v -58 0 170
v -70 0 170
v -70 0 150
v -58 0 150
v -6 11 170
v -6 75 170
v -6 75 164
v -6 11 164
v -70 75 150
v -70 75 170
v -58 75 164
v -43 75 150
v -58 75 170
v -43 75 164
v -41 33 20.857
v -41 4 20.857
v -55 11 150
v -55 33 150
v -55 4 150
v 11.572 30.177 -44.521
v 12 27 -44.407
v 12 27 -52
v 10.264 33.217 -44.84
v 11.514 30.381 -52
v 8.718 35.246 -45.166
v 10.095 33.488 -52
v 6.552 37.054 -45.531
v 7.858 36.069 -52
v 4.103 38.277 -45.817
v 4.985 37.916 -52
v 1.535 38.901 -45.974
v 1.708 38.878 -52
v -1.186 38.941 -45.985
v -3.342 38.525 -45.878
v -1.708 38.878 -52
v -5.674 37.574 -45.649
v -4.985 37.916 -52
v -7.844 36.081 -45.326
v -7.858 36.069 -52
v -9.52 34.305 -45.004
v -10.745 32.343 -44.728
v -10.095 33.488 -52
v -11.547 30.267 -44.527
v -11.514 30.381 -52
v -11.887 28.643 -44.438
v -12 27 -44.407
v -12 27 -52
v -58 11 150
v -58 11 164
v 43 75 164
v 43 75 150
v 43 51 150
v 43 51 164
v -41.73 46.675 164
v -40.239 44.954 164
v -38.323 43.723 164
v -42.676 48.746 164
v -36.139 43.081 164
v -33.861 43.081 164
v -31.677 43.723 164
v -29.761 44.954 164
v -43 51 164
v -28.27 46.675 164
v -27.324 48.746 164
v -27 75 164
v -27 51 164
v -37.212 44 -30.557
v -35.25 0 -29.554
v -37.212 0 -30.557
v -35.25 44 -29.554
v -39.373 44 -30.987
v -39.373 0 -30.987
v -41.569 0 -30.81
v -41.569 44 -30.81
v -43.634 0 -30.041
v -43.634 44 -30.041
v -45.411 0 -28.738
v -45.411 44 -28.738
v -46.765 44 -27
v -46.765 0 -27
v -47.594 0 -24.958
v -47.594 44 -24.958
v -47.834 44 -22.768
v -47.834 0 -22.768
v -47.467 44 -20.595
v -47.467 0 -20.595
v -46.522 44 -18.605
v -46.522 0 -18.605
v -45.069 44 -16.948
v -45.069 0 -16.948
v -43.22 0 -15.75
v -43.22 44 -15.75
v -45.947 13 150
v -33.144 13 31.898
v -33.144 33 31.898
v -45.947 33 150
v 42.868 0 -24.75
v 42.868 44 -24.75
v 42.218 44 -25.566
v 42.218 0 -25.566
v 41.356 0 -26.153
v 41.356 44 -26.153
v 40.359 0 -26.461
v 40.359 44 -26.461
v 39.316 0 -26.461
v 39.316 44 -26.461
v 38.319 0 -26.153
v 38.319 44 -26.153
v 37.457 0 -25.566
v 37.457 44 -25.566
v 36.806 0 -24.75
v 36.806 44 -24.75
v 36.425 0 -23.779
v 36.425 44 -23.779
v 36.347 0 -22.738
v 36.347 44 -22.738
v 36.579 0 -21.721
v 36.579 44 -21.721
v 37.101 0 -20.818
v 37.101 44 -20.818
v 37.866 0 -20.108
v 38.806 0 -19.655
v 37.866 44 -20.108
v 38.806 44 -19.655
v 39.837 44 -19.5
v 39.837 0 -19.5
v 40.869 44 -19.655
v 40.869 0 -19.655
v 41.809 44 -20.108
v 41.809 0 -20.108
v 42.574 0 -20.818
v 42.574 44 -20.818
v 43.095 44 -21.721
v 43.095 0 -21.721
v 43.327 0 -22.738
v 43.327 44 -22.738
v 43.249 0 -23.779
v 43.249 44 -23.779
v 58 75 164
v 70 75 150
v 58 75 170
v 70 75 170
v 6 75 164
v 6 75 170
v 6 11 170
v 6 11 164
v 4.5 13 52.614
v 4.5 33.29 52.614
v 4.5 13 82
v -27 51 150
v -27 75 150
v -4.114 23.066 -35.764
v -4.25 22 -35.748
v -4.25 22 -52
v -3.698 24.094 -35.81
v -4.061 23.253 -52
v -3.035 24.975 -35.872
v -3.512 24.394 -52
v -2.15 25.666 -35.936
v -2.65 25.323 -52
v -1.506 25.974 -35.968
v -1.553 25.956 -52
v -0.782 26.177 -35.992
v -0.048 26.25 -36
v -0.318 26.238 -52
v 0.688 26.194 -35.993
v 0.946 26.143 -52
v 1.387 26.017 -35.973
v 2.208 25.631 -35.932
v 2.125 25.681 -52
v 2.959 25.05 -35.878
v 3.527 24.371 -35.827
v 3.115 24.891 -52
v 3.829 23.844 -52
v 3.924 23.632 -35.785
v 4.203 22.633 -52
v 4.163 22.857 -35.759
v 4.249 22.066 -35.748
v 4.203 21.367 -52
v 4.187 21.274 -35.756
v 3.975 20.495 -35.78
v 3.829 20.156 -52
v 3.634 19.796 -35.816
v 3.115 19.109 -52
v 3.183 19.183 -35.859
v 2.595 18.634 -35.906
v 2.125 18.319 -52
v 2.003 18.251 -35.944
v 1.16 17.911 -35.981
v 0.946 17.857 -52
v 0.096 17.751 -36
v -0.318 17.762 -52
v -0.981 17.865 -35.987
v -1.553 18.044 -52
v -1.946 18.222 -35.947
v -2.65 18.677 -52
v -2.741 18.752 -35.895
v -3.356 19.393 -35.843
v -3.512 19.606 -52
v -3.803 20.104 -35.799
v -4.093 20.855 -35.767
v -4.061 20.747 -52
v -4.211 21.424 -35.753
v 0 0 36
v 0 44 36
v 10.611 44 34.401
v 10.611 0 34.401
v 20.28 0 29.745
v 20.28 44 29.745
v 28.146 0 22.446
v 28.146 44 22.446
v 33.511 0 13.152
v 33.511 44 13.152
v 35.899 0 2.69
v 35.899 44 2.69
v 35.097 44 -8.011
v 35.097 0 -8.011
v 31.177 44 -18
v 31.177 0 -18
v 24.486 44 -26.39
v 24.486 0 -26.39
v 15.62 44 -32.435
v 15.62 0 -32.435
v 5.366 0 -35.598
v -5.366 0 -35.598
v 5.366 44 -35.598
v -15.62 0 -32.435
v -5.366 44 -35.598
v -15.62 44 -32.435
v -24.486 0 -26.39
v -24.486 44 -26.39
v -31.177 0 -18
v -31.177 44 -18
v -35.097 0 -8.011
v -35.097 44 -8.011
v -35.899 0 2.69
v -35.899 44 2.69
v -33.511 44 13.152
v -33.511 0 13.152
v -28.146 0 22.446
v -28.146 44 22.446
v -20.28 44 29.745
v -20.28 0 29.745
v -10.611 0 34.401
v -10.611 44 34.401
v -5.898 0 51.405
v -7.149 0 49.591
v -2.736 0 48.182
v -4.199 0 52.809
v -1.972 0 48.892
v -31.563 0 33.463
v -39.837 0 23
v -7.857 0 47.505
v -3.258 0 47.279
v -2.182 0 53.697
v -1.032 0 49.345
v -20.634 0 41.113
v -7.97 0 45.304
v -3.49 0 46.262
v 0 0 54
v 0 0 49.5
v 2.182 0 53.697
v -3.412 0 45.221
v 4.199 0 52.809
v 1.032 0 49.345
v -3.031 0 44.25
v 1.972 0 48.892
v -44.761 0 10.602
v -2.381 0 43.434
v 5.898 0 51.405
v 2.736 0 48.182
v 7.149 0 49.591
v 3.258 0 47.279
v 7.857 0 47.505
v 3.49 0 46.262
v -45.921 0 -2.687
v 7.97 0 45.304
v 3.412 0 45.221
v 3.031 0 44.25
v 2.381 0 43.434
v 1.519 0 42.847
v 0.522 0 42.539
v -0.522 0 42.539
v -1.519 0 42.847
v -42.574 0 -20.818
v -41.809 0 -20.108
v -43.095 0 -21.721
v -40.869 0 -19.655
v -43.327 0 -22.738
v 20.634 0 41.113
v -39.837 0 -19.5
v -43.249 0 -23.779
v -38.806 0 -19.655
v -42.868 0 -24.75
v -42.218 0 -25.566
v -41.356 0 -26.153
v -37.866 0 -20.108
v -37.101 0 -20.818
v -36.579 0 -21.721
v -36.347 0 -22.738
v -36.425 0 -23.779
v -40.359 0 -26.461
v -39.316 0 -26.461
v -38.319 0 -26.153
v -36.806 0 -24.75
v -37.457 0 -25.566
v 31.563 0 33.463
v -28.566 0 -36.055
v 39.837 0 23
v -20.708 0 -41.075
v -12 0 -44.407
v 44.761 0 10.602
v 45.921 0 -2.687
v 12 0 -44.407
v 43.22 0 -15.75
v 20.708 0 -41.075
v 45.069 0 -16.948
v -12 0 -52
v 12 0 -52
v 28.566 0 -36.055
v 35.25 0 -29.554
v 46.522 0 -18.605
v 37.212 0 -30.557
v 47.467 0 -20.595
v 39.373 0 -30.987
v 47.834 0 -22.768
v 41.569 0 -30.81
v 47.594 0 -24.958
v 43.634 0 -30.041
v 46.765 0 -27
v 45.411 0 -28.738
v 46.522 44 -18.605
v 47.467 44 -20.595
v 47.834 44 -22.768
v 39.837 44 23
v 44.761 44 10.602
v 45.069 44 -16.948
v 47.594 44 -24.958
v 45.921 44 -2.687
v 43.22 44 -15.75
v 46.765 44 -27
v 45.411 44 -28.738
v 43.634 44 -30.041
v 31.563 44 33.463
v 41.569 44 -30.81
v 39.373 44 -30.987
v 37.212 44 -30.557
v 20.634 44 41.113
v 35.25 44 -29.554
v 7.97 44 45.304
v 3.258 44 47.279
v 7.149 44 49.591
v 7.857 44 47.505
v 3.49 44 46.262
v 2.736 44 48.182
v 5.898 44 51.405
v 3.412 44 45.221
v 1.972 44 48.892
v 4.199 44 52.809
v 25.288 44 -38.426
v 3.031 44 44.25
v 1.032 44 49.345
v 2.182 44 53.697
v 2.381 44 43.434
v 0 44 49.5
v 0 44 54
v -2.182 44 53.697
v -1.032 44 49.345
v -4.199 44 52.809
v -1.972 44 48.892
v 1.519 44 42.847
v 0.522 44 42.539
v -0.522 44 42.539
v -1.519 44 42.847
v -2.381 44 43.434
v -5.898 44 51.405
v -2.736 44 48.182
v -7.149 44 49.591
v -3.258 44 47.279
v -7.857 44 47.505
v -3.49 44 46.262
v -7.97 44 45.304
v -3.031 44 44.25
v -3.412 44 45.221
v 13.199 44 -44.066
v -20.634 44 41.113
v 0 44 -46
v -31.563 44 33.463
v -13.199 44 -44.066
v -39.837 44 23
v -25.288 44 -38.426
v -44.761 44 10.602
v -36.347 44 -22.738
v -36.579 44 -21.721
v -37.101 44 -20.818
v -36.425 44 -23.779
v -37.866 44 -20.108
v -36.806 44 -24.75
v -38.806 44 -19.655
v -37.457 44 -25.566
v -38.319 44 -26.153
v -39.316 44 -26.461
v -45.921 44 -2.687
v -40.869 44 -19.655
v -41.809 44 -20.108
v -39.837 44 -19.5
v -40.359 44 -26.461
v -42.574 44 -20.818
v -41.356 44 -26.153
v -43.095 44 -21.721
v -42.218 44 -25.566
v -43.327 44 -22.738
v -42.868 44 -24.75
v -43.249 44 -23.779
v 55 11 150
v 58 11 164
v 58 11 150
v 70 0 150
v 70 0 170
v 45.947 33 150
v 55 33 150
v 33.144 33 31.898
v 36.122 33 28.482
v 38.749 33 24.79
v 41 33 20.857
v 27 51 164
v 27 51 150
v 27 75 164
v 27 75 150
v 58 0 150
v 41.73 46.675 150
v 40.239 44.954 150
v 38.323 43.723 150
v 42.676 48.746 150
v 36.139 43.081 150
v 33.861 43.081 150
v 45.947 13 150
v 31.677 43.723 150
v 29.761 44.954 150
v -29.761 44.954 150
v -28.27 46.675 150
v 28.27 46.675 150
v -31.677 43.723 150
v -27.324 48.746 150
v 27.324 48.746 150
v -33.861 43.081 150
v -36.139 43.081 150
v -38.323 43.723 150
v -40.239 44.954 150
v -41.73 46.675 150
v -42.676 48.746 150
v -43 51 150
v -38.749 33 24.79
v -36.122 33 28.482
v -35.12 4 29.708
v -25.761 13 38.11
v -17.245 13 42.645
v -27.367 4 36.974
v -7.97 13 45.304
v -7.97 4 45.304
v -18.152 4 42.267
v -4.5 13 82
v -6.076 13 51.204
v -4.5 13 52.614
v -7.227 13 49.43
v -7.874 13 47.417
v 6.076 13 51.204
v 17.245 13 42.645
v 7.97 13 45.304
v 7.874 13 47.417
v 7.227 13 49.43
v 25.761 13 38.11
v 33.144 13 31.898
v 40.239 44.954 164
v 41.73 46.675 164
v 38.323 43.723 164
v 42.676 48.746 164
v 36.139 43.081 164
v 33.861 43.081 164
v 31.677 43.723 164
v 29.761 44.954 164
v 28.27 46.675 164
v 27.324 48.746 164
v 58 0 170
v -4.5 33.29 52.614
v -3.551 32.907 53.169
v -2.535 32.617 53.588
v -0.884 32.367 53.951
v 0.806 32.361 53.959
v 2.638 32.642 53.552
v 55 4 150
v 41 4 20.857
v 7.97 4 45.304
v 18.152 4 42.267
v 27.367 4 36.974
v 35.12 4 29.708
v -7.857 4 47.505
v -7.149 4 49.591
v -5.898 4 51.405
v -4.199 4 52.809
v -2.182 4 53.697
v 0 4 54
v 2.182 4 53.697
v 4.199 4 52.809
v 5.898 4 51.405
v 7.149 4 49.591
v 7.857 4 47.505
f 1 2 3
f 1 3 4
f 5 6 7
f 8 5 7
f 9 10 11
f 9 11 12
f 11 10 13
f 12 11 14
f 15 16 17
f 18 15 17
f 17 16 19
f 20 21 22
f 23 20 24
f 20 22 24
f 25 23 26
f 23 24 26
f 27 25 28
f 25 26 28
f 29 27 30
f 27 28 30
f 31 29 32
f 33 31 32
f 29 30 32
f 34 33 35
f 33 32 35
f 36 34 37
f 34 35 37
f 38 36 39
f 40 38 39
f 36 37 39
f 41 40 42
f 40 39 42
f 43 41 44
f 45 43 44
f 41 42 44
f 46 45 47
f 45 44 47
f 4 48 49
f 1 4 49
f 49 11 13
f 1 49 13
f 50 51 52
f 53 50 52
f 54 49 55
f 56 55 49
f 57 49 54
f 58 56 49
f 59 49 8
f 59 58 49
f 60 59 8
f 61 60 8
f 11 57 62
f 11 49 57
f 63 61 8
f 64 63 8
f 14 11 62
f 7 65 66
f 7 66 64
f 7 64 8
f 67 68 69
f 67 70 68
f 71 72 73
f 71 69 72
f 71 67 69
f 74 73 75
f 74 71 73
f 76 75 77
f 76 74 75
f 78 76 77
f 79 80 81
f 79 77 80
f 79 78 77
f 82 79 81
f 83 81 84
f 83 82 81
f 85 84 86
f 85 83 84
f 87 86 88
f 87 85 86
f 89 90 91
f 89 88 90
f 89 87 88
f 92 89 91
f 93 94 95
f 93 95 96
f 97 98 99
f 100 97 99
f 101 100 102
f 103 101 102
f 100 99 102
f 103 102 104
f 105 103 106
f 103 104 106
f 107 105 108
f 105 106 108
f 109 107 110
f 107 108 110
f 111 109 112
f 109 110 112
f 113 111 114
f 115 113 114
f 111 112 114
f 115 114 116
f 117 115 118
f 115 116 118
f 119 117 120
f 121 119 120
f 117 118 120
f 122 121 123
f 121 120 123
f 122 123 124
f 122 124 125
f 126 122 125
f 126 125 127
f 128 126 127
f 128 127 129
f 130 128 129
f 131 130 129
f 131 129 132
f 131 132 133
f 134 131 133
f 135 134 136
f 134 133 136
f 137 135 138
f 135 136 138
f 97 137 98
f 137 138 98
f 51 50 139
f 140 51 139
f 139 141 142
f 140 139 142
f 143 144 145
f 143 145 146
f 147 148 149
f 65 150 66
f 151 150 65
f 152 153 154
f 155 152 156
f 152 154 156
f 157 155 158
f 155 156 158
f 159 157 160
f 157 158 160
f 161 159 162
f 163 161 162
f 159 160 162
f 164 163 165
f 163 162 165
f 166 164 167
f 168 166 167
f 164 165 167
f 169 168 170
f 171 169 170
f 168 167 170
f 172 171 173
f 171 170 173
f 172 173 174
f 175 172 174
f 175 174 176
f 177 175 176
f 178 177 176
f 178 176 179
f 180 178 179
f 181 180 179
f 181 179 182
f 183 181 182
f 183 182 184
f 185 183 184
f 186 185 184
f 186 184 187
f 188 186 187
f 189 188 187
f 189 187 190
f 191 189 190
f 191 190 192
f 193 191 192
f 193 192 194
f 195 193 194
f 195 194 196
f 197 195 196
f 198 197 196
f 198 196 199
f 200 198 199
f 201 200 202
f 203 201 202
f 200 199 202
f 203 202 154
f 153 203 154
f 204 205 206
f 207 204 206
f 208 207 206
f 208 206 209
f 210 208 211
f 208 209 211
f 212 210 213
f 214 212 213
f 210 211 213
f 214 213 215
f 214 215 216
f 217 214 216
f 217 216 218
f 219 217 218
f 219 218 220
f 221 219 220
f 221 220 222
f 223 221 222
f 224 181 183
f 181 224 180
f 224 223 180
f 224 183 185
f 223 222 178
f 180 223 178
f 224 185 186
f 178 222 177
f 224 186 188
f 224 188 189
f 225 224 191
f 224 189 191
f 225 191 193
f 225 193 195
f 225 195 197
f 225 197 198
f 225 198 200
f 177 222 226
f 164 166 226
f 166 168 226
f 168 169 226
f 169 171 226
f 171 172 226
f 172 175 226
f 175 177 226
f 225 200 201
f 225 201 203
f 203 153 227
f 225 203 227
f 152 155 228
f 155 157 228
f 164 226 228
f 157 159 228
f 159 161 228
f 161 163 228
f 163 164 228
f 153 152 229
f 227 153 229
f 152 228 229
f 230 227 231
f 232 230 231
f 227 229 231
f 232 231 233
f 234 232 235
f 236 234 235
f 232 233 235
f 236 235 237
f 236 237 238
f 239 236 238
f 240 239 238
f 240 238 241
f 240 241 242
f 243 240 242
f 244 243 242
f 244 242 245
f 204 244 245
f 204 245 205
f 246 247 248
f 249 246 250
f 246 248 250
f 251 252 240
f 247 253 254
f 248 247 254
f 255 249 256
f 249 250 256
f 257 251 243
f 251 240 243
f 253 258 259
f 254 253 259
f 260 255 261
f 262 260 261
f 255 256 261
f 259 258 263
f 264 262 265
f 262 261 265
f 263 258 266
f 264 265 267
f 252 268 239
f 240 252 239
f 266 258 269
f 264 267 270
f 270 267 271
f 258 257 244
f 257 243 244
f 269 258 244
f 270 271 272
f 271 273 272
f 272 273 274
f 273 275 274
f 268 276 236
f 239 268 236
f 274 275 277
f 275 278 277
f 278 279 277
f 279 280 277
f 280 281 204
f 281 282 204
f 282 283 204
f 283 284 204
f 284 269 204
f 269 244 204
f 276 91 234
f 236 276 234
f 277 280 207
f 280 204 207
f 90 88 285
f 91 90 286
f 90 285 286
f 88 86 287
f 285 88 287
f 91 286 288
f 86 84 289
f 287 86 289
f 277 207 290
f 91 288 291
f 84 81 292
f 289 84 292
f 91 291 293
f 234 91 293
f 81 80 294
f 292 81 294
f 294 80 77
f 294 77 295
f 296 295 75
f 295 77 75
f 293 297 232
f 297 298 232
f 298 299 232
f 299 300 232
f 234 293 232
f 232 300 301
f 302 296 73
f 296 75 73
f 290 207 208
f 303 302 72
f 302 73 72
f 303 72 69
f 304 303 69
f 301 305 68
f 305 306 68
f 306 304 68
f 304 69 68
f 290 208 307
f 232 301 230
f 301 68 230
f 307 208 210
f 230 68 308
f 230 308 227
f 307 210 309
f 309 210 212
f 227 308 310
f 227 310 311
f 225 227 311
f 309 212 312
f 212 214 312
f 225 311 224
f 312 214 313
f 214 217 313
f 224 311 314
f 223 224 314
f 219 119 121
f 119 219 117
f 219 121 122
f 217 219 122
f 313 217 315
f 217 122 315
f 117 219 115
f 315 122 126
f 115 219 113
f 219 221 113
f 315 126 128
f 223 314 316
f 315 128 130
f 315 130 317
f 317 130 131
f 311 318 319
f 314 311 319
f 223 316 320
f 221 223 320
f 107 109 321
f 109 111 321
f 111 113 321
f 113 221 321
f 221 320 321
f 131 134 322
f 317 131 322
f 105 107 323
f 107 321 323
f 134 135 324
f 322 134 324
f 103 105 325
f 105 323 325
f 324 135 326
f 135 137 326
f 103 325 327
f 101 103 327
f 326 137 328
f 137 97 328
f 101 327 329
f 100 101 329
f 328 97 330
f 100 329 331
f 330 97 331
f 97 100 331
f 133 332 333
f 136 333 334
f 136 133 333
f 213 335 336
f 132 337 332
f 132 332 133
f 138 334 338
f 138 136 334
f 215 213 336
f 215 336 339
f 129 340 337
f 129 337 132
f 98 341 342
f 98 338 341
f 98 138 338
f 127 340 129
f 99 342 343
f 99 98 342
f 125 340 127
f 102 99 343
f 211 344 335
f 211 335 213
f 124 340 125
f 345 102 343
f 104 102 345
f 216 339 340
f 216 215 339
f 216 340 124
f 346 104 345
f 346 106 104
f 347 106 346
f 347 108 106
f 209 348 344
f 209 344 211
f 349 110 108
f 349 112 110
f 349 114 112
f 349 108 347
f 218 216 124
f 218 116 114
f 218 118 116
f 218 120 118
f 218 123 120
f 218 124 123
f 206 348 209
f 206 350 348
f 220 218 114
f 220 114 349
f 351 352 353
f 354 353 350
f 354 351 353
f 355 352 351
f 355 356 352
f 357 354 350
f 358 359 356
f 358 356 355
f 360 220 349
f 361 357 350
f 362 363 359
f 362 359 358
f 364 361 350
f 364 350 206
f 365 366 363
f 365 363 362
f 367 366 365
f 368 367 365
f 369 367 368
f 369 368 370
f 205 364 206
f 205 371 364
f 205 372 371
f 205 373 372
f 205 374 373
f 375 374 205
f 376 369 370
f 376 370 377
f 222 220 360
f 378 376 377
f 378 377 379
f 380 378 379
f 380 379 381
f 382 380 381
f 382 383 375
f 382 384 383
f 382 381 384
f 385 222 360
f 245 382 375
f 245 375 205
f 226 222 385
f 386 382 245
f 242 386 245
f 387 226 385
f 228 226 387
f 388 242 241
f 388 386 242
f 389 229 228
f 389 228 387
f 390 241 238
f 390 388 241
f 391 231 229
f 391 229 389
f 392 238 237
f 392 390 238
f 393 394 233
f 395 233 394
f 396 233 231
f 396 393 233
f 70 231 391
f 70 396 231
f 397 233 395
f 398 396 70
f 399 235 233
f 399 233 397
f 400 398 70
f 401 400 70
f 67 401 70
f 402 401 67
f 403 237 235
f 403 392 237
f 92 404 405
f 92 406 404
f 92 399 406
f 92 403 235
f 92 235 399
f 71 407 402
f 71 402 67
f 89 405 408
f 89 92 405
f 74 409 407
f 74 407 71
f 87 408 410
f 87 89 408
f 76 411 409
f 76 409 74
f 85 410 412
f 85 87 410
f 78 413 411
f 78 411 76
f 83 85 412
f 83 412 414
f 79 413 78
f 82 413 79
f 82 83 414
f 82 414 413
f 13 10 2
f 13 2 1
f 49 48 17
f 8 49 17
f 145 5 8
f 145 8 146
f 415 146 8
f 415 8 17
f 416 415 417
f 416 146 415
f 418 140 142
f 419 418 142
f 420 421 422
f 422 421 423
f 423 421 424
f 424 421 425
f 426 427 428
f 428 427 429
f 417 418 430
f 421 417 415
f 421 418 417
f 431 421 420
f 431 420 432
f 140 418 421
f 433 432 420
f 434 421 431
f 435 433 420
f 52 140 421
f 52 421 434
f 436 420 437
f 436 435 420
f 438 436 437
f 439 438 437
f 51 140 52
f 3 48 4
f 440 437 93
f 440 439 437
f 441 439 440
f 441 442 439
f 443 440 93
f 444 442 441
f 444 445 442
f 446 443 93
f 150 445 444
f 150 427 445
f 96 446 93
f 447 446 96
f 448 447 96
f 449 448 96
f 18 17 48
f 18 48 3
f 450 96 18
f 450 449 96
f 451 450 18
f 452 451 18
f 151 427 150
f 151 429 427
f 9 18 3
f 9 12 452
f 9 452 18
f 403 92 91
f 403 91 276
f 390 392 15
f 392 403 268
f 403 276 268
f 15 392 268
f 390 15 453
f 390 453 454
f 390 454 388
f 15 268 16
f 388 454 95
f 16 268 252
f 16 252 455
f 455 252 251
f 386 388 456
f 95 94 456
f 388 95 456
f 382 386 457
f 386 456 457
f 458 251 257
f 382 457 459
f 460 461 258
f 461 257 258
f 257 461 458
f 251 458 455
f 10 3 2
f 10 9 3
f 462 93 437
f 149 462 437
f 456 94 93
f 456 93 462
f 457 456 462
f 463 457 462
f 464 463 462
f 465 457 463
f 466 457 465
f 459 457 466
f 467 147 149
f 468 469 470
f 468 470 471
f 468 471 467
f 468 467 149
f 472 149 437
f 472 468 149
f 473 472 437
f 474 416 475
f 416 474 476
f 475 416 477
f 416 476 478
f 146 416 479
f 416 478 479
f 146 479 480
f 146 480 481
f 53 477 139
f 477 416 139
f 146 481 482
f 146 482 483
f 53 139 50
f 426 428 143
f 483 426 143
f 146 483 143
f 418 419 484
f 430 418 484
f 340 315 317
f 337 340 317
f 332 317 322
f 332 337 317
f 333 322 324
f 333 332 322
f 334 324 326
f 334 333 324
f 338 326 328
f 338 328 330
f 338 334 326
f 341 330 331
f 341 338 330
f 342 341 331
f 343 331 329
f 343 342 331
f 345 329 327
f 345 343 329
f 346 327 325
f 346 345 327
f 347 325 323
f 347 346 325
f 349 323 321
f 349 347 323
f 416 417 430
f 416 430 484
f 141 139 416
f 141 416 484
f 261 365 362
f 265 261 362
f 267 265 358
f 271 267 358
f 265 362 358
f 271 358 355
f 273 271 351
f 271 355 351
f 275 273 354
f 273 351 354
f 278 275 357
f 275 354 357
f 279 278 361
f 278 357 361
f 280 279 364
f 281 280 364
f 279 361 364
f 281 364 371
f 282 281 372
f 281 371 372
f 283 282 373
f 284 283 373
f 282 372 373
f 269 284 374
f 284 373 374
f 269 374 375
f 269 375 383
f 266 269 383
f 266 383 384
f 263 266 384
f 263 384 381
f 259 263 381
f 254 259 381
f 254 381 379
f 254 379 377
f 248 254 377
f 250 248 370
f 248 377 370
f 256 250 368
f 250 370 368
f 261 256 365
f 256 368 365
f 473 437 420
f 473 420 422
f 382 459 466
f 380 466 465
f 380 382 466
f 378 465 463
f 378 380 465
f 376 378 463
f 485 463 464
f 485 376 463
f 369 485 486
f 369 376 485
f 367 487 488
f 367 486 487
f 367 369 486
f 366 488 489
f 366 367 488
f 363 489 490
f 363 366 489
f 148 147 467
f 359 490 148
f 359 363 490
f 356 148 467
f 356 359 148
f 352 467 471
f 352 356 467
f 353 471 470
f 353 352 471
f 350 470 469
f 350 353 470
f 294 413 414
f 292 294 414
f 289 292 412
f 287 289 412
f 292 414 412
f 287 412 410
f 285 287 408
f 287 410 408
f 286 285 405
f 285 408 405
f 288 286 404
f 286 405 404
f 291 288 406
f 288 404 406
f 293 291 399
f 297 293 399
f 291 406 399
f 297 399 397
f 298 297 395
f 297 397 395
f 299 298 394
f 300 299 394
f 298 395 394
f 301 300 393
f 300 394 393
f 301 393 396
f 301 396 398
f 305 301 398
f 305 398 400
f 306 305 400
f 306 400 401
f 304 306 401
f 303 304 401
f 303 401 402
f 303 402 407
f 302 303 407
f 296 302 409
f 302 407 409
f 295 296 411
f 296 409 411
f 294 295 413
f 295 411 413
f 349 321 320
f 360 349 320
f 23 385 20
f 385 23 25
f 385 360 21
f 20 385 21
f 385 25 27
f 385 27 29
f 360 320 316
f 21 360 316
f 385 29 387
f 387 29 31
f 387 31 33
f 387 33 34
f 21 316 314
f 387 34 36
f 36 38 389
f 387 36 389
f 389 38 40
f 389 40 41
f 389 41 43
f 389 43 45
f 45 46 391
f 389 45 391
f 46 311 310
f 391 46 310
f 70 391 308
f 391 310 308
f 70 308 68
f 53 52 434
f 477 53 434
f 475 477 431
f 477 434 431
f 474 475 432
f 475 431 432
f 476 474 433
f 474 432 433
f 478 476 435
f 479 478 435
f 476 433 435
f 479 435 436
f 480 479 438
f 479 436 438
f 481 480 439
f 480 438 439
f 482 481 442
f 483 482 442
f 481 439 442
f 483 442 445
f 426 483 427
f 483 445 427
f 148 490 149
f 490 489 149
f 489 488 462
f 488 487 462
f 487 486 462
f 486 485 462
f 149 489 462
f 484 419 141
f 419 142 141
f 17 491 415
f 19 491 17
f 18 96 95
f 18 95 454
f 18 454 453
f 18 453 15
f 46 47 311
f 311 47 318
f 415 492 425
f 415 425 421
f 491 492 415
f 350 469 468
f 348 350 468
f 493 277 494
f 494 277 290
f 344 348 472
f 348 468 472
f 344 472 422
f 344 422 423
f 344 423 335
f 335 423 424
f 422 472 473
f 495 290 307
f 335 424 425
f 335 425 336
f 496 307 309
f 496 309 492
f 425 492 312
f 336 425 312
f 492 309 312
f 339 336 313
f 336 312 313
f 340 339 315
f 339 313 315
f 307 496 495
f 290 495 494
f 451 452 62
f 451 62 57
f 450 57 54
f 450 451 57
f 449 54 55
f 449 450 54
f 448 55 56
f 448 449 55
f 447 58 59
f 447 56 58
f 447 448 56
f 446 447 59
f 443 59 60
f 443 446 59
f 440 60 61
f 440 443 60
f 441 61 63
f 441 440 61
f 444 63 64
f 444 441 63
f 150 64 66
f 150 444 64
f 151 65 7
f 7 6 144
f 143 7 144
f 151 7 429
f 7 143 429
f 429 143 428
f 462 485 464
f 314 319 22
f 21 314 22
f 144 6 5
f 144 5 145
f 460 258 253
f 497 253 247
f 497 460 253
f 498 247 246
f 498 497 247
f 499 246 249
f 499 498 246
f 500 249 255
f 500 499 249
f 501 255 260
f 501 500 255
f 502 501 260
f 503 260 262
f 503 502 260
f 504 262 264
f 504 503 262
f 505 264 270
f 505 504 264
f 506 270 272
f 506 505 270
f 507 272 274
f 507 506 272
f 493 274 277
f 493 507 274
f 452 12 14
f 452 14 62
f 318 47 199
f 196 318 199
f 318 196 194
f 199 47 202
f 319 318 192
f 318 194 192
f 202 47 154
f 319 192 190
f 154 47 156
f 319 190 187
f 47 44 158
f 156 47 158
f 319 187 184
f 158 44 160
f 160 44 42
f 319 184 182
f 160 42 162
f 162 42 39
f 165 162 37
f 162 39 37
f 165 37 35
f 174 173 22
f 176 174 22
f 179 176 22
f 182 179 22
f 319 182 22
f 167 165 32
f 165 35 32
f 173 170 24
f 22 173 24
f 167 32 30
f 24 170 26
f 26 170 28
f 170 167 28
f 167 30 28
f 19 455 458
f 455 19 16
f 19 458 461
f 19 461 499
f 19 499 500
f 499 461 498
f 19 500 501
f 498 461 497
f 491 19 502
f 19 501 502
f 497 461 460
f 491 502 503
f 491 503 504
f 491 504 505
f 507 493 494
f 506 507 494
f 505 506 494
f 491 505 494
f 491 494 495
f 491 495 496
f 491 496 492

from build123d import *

# Parameters (mm, degrees)
SKETCH_1_R               = 46
EXTRUDE_1_DEPTH          = 44
SKETCH_2_R               = 8
EXTRUDE_2_DEPTH          = 44
SKETCH_3_R               = 3.5
CUT_EXTRUDE_1_DEPTH      = 44
PATTERN_CIRCULAR_1_COUNT = 3
EXTRUDE_START            = -52
EXTRUDE_3_DEPTH          = 44
SKETCH_6_R               = 36
CUT_EXTRUDE_2_DEPTH      = 44
HOLE_WIZARD_M10_1_REACH  = 126.34
HOLE_WIZARD_M10_1_BORE_R = 4.25
EXTRUDE_START_2          = 4
EXTRUDE_4_DEPTH          = 9
EXTRUDE_5_DEPTH          = 20
RIB_1_REACH              = 167.714
SKETCH_11_WALL_W         = 368.62723947
SKETCH_11_WALL_H         = 9
EXTRUDE_START_3          = 170
SKETCH_13_W              = 140
SKETCH_13_H              = 64
EXTRUDE_6_DEPTH          = 20
CUT_EXTRUDE_3_DEPTH      = 227.559043166
SKETCH_15_W              = 52
SKETCH_15_H              = 6
CUT_EXTRUDE_4_DEPTH      = 199.557296554
SKETCH_17_W              = 12
SKETCH_17_H              = 20
EXTRUDE_7_DEPTH          = 11


with BuildPart() as part:
    # 草图1 → 凸台-拉伸1 (new body)
    with BuildSketch(Plane(origin=(0, 0, 0), x_dir=(1, 0, 0), z_dir=(0, 1, 0))):
        with Locations(Location((0, 0, 0), (0, 0, 270))):
            Circle(SKETCH_1_R)
    extrude(amount=EXTRUDE_1_DEPTH)

    # 草图2 → 凸台-拉伸2 (add)
    with BuildSketch(Plane(origin=(0, 44, 0), x_dir=(1, 0, 0), z_dir=(0, 1, 0))):
        with Locations((0, -46)):
            Circle(SKETCH_2_R)
    extrude_2 = extrude(amount=-EXTRUDE_2_DEPTH)

    # 草图3 → 切除-拉伸1 (cut)
    with BuildSketch(Plane(origin=(0, 44, 0), x_dir=(1, 0, 0), z_dir=(0, 1, 0))):
        with Locations(Location((0, -46, 0), (0, 0, 270))):
            Circle(SKETCH_3_R)
    cut_extrude_1 = extrude(amount=-CUT_EXTRUDE_1_DEPTH, mode=Mode.SUBTRACT)

    # 阵列(圆周)1: 凸台-拉伸2, 切除-拉伸1 ×3 about axis
    pattern_circular_1_axis = Axis((0, 0, 0), (0, 1, 0))
    add([extrude_2.rotate(pattern_circular_1_axis, i * 360 / PATTERN_CIRCULAR_1_COUNT) for i in range(1, PATTERN_CIRCULAR_1_COUNT)])
    add([cut_extrude_1.rotate(pattern_circular_1_axis, i * 360 / PATTERN_CIRCULAR_1_COUNT) for i in range(1, PATTERN_CIRCULAR_1_COUNT)], mode=Mode.SUBTRACT)

    # 草图5 → 凸台-拉伸3 (add)
    with BuildSketch(Plane.XY.offset(EXTRUDE_START)):
        with BuildLine():
            Line((-12, 27), (-12, 0))
            Line((-12, 0), (12, 0))
            Line((12, 0), (12, 27))
            ThreePointArc((12, 27), (0, 39), (-12, 27))
        make_face()
    extrude(amount=EXTRUDE_3_DEPTH)

    # 草图6 → 切除-拉伸2 (cut)
    with BuildSketch(Plane(origin=(0, 44, 0), x_dir=(1, 0, 0), z_dir=(0, 1, 0))):
        with Locations(Location((0, 0, 0), (0, 0, 270))):
            Circle(SKETCH_6_R)
    extrude(amount=-CUT_EXTRUDE_2_DEPTH, mode=Mode.SUBTRACT)

    # M10 螺纹孔1 bore → M10 螺纹孔1 (cut, up to next)
    with BuildSketch(Plane(origin=(0, 0, -52), x_dir=(-1, 0, 0), z_dir=(0, 0, -1)), mode=Mode.PRIVATE) as hole_wizard_m10_1_sk1:
        with Locations((0, 22)):
            Circle(HOLE_WIZARD_M10_1_BORE_R)
    hole_wizard_m10_1_tool1 = extrude(hole_wizard_m10_1_sk1.sketch, amount=-HOLE_WIZARD_M10_1_REACH, mode=Mode.PRIVATE) & part.part
    add(hole_wizard_m10_1_tool1.solids().sort_by_distance((0, 22, -52))[0], mode=Mode.SUBTRACT)

    # 草图9 → 凸台-拉伸4 (add)
    with BuildSketch(Plane(origin=(0, 0, 0), x_dir=(1, 0, 0), z_dir=(0, 1, 0)).offset(EXTRUDE_START_2)):
        with BuildLine():
            Line((-41, -20.856653615), (-55, -150))
            Line((-55, -150), (55, -150))
            Line((55, -150), (41, -20.856653615))
            ThreePointArc((41, -20.856653615), (27.366589863, -36.973906465), (7.969696861, -45.304347826))
            ThreePointArc((7.969696861, -45.304347826), (0, -54), (-7.969696861, -45.304347826))
            ThreePointArc((-7.969696861, -45.304347826), (-27.366589863, -36.973906465), (-41, -20.856653615))
        make_face()
    extrude(amount=EXTRUDE_4_DEPTH)

    # 草图10 → 凸台-拉伸5 (add)
    with BuildSketch(Plane(origin=(0, 13, 0), x_dir=(1, 0, 0), z_dir=(0, 1, 0))):
        with BuildLine():
            Line((45.947270441, -150), (33.144192236, -31.897688333))
            ThreePointArc((33.144192236, -31.897688333), (37.480880759, -26.668025377), (41, -20.856653615))
            Line((41, -20.856653615), (55, -150))
            Line((55, -150), (45.947270441, -150))
        make_face()
        with BuildLine():
            Line((-33.144192236, -31.897688333), (-45.947270441, -150))
            Line((-45.947270441, -150), (-55, -150))
            Line((-55, -150), (-41, -20.856653615))
            ThreePointArc((-41, -20.856653615), (-37.480880759, -26.668025377), (-33.144192236, -31.897688333))
        make_face()
    extrude(amount=EXTRUDE_5_DEPTH)

    # 草图11 wall → 筋1 (add, up to next)
    with BuildSketch(Plane(origin=(0, 23, 67.516892633), x_dir=(0, -0.568181452229, 0.822903297686), z_dir=(0, -0.822903297686, -0.568181452229)), mode=Mode.PRIVATE) as rib_1_sk1:
        Rectangle(SKETCH_11_WALL_W, SKETCH_11_WALL_H)
    rib_1_tool1 = extrude(rib_1_sk1.sketch, amount=RIB_1_REACH, mode=Mode.PRIVATE) - part.part
    add(rib_1_tool1.solids().sort_by_distance((0, 23, 67.516892633))[0])

    # 草图13 → 凸台-拉伸6 (add)
    with BuildSketch(Plane.XY.offset(EXTRUDE_START_3)):
        with Locations((0, 43)):
            Rectangle(SKETCH_13_W, SKETCH_13_H)
    extrude(amount=-EXTRUDE_6_DEPTH)

    # 草图14 → 切除-拉伸3 (cut, through all)
    with BuildSketch(Plane(origin=(0, 0, 150), x_dir=(-1, 0, 0), z_dir=(0, 0, -1))):
        with BuildLine():
            Line((43, 75), (43, 51))
            ThreePointArc((43, 51), (35, 43), (27, 51))
            Line((27, 51), (27, 75))
            ThreePointArc((27, 75), (35, 83), (43, 75))
        make_face()
    cut_extrude_3 = extrude(amount=-CUT_EXTRUDE_3_DEPTH, mode=Mode.SUBTRACT)

    # 镜向1: 切除-拉伸3 across plane
    add(cut_extrude_3.mirror(Plane(origin=(0, 0, 0), x_dir=(0, 0, 1), z_dir=(1, 0, 0))), mode=Mode.SUBTRACT)

    # 草图15 → 切除-拉伸4 (cut, through all)
    with BuildSketch(Plane(origin=(0, 75, 0), x_dir=(1, 0, 0), z_dir=(0, 1, 0))):
        with Locations((-32, -167)):
            Rectangle(SKETCH_15_W, SKETCH_15_H)
    cut_extrude_4 = extrude(amount=-CUT_EXTRUDE_4_DEPTH, mode=Mode.SUBTRACT)

    # 镜向2: 切除-拉伸4 across plane
    add(cut_extrude_4.mirror(Plane(origin=(0, 0, 0), x_dir=(0, 0, 1), z_dir=(1, 0, 0))), mode=Mode.SUBTRACT)

    # 草图17 → 凸台-拉伸7 (add)
    with BuildSketch(Plane.XZ.offset(-11)):
        with Locations((-64, 160)):
            Rectangle(SKETCH_17_W, SKETCH_17_H)
    extrude_7 = extrude(amount=EXTRUDE_7_DEPTH)

    # 镜向3: 凸台-拉伸7 across plane
    add(extrude_7.mirror(Plane(origin=(0, 0, 0), x_dir=(0, 0, 1), z_dir=(1, 0, 0))))


solid = part.part
